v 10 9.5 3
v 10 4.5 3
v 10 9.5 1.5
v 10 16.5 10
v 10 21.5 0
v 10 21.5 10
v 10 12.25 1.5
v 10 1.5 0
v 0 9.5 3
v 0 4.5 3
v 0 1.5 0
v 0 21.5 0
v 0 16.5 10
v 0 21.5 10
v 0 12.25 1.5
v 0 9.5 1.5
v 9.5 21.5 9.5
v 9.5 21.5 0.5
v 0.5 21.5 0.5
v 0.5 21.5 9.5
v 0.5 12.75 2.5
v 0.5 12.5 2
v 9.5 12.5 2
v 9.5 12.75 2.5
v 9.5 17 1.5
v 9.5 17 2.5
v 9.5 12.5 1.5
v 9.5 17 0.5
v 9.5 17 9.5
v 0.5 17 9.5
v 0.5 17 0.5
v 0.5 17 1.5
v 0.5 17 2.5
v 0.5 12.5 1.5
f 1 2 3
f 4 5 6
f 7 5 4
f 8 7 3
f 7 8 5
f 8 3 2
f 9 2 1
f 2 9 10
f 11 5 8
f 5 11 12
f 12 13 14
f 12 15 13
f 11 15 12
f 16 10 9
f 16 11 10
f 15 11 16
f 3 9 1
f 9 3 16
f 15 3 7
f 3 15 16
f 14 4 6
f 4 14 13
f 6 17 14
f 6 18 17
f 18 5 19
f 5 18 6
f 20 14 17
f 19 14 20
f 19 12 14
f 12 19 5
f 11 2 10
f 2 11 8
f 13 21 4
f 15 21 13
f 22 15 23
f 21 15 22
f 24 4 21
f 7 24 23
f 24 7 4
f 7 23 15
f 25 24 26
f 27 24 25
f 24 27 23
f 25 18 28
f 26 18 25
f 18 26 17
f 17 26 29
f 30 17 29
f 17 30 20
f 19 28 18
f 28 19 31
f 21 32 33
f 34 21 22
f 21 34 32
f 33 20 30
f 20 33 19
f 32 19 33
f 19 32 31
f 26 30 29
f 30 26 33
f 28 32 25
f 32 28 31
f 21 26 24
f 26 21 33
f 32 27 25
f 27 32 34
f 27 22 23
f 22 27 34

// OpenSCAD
module prism(l, w, h){
       polyhedron(
               points=[[0,0,0], [l,0,0], [l,w,0], [0,w,0], [0,w,h], [l,w,h]],
               faces=[[0,1,2,3],[5,4,3,2],[0,4,5,1],[0,3,4],[5,2,1]]
               );
       }
// Base
difference() {
    union() {
        // Front lip
        translate([5,7,1.5]) {
            cube([10,5,3],true);    
        }
        
        // Laptop lip contact
        translate([5,10,.75]) {
            cube([10,5,1.5],true);    
        }
        
        // Fan case
        translate([5,19,5]) {
            cube([10,5,10],true);    
        }
        
        // Front ramp
        translate([0,1.5,0]) {
            prism(10, 3, 3);
        }
        
        // Laptop contact ramp
        translate([0,11.5,0]) {
            prism(10, 5, 10);
        }
    }
        // Fan case hole
        translate([5,21,5]) {
            cube([9,8,9],true);    
        }
        // Cooling duct
        translate([5,20,2]) {
            cube([9,15,1],true);    
        }
}
